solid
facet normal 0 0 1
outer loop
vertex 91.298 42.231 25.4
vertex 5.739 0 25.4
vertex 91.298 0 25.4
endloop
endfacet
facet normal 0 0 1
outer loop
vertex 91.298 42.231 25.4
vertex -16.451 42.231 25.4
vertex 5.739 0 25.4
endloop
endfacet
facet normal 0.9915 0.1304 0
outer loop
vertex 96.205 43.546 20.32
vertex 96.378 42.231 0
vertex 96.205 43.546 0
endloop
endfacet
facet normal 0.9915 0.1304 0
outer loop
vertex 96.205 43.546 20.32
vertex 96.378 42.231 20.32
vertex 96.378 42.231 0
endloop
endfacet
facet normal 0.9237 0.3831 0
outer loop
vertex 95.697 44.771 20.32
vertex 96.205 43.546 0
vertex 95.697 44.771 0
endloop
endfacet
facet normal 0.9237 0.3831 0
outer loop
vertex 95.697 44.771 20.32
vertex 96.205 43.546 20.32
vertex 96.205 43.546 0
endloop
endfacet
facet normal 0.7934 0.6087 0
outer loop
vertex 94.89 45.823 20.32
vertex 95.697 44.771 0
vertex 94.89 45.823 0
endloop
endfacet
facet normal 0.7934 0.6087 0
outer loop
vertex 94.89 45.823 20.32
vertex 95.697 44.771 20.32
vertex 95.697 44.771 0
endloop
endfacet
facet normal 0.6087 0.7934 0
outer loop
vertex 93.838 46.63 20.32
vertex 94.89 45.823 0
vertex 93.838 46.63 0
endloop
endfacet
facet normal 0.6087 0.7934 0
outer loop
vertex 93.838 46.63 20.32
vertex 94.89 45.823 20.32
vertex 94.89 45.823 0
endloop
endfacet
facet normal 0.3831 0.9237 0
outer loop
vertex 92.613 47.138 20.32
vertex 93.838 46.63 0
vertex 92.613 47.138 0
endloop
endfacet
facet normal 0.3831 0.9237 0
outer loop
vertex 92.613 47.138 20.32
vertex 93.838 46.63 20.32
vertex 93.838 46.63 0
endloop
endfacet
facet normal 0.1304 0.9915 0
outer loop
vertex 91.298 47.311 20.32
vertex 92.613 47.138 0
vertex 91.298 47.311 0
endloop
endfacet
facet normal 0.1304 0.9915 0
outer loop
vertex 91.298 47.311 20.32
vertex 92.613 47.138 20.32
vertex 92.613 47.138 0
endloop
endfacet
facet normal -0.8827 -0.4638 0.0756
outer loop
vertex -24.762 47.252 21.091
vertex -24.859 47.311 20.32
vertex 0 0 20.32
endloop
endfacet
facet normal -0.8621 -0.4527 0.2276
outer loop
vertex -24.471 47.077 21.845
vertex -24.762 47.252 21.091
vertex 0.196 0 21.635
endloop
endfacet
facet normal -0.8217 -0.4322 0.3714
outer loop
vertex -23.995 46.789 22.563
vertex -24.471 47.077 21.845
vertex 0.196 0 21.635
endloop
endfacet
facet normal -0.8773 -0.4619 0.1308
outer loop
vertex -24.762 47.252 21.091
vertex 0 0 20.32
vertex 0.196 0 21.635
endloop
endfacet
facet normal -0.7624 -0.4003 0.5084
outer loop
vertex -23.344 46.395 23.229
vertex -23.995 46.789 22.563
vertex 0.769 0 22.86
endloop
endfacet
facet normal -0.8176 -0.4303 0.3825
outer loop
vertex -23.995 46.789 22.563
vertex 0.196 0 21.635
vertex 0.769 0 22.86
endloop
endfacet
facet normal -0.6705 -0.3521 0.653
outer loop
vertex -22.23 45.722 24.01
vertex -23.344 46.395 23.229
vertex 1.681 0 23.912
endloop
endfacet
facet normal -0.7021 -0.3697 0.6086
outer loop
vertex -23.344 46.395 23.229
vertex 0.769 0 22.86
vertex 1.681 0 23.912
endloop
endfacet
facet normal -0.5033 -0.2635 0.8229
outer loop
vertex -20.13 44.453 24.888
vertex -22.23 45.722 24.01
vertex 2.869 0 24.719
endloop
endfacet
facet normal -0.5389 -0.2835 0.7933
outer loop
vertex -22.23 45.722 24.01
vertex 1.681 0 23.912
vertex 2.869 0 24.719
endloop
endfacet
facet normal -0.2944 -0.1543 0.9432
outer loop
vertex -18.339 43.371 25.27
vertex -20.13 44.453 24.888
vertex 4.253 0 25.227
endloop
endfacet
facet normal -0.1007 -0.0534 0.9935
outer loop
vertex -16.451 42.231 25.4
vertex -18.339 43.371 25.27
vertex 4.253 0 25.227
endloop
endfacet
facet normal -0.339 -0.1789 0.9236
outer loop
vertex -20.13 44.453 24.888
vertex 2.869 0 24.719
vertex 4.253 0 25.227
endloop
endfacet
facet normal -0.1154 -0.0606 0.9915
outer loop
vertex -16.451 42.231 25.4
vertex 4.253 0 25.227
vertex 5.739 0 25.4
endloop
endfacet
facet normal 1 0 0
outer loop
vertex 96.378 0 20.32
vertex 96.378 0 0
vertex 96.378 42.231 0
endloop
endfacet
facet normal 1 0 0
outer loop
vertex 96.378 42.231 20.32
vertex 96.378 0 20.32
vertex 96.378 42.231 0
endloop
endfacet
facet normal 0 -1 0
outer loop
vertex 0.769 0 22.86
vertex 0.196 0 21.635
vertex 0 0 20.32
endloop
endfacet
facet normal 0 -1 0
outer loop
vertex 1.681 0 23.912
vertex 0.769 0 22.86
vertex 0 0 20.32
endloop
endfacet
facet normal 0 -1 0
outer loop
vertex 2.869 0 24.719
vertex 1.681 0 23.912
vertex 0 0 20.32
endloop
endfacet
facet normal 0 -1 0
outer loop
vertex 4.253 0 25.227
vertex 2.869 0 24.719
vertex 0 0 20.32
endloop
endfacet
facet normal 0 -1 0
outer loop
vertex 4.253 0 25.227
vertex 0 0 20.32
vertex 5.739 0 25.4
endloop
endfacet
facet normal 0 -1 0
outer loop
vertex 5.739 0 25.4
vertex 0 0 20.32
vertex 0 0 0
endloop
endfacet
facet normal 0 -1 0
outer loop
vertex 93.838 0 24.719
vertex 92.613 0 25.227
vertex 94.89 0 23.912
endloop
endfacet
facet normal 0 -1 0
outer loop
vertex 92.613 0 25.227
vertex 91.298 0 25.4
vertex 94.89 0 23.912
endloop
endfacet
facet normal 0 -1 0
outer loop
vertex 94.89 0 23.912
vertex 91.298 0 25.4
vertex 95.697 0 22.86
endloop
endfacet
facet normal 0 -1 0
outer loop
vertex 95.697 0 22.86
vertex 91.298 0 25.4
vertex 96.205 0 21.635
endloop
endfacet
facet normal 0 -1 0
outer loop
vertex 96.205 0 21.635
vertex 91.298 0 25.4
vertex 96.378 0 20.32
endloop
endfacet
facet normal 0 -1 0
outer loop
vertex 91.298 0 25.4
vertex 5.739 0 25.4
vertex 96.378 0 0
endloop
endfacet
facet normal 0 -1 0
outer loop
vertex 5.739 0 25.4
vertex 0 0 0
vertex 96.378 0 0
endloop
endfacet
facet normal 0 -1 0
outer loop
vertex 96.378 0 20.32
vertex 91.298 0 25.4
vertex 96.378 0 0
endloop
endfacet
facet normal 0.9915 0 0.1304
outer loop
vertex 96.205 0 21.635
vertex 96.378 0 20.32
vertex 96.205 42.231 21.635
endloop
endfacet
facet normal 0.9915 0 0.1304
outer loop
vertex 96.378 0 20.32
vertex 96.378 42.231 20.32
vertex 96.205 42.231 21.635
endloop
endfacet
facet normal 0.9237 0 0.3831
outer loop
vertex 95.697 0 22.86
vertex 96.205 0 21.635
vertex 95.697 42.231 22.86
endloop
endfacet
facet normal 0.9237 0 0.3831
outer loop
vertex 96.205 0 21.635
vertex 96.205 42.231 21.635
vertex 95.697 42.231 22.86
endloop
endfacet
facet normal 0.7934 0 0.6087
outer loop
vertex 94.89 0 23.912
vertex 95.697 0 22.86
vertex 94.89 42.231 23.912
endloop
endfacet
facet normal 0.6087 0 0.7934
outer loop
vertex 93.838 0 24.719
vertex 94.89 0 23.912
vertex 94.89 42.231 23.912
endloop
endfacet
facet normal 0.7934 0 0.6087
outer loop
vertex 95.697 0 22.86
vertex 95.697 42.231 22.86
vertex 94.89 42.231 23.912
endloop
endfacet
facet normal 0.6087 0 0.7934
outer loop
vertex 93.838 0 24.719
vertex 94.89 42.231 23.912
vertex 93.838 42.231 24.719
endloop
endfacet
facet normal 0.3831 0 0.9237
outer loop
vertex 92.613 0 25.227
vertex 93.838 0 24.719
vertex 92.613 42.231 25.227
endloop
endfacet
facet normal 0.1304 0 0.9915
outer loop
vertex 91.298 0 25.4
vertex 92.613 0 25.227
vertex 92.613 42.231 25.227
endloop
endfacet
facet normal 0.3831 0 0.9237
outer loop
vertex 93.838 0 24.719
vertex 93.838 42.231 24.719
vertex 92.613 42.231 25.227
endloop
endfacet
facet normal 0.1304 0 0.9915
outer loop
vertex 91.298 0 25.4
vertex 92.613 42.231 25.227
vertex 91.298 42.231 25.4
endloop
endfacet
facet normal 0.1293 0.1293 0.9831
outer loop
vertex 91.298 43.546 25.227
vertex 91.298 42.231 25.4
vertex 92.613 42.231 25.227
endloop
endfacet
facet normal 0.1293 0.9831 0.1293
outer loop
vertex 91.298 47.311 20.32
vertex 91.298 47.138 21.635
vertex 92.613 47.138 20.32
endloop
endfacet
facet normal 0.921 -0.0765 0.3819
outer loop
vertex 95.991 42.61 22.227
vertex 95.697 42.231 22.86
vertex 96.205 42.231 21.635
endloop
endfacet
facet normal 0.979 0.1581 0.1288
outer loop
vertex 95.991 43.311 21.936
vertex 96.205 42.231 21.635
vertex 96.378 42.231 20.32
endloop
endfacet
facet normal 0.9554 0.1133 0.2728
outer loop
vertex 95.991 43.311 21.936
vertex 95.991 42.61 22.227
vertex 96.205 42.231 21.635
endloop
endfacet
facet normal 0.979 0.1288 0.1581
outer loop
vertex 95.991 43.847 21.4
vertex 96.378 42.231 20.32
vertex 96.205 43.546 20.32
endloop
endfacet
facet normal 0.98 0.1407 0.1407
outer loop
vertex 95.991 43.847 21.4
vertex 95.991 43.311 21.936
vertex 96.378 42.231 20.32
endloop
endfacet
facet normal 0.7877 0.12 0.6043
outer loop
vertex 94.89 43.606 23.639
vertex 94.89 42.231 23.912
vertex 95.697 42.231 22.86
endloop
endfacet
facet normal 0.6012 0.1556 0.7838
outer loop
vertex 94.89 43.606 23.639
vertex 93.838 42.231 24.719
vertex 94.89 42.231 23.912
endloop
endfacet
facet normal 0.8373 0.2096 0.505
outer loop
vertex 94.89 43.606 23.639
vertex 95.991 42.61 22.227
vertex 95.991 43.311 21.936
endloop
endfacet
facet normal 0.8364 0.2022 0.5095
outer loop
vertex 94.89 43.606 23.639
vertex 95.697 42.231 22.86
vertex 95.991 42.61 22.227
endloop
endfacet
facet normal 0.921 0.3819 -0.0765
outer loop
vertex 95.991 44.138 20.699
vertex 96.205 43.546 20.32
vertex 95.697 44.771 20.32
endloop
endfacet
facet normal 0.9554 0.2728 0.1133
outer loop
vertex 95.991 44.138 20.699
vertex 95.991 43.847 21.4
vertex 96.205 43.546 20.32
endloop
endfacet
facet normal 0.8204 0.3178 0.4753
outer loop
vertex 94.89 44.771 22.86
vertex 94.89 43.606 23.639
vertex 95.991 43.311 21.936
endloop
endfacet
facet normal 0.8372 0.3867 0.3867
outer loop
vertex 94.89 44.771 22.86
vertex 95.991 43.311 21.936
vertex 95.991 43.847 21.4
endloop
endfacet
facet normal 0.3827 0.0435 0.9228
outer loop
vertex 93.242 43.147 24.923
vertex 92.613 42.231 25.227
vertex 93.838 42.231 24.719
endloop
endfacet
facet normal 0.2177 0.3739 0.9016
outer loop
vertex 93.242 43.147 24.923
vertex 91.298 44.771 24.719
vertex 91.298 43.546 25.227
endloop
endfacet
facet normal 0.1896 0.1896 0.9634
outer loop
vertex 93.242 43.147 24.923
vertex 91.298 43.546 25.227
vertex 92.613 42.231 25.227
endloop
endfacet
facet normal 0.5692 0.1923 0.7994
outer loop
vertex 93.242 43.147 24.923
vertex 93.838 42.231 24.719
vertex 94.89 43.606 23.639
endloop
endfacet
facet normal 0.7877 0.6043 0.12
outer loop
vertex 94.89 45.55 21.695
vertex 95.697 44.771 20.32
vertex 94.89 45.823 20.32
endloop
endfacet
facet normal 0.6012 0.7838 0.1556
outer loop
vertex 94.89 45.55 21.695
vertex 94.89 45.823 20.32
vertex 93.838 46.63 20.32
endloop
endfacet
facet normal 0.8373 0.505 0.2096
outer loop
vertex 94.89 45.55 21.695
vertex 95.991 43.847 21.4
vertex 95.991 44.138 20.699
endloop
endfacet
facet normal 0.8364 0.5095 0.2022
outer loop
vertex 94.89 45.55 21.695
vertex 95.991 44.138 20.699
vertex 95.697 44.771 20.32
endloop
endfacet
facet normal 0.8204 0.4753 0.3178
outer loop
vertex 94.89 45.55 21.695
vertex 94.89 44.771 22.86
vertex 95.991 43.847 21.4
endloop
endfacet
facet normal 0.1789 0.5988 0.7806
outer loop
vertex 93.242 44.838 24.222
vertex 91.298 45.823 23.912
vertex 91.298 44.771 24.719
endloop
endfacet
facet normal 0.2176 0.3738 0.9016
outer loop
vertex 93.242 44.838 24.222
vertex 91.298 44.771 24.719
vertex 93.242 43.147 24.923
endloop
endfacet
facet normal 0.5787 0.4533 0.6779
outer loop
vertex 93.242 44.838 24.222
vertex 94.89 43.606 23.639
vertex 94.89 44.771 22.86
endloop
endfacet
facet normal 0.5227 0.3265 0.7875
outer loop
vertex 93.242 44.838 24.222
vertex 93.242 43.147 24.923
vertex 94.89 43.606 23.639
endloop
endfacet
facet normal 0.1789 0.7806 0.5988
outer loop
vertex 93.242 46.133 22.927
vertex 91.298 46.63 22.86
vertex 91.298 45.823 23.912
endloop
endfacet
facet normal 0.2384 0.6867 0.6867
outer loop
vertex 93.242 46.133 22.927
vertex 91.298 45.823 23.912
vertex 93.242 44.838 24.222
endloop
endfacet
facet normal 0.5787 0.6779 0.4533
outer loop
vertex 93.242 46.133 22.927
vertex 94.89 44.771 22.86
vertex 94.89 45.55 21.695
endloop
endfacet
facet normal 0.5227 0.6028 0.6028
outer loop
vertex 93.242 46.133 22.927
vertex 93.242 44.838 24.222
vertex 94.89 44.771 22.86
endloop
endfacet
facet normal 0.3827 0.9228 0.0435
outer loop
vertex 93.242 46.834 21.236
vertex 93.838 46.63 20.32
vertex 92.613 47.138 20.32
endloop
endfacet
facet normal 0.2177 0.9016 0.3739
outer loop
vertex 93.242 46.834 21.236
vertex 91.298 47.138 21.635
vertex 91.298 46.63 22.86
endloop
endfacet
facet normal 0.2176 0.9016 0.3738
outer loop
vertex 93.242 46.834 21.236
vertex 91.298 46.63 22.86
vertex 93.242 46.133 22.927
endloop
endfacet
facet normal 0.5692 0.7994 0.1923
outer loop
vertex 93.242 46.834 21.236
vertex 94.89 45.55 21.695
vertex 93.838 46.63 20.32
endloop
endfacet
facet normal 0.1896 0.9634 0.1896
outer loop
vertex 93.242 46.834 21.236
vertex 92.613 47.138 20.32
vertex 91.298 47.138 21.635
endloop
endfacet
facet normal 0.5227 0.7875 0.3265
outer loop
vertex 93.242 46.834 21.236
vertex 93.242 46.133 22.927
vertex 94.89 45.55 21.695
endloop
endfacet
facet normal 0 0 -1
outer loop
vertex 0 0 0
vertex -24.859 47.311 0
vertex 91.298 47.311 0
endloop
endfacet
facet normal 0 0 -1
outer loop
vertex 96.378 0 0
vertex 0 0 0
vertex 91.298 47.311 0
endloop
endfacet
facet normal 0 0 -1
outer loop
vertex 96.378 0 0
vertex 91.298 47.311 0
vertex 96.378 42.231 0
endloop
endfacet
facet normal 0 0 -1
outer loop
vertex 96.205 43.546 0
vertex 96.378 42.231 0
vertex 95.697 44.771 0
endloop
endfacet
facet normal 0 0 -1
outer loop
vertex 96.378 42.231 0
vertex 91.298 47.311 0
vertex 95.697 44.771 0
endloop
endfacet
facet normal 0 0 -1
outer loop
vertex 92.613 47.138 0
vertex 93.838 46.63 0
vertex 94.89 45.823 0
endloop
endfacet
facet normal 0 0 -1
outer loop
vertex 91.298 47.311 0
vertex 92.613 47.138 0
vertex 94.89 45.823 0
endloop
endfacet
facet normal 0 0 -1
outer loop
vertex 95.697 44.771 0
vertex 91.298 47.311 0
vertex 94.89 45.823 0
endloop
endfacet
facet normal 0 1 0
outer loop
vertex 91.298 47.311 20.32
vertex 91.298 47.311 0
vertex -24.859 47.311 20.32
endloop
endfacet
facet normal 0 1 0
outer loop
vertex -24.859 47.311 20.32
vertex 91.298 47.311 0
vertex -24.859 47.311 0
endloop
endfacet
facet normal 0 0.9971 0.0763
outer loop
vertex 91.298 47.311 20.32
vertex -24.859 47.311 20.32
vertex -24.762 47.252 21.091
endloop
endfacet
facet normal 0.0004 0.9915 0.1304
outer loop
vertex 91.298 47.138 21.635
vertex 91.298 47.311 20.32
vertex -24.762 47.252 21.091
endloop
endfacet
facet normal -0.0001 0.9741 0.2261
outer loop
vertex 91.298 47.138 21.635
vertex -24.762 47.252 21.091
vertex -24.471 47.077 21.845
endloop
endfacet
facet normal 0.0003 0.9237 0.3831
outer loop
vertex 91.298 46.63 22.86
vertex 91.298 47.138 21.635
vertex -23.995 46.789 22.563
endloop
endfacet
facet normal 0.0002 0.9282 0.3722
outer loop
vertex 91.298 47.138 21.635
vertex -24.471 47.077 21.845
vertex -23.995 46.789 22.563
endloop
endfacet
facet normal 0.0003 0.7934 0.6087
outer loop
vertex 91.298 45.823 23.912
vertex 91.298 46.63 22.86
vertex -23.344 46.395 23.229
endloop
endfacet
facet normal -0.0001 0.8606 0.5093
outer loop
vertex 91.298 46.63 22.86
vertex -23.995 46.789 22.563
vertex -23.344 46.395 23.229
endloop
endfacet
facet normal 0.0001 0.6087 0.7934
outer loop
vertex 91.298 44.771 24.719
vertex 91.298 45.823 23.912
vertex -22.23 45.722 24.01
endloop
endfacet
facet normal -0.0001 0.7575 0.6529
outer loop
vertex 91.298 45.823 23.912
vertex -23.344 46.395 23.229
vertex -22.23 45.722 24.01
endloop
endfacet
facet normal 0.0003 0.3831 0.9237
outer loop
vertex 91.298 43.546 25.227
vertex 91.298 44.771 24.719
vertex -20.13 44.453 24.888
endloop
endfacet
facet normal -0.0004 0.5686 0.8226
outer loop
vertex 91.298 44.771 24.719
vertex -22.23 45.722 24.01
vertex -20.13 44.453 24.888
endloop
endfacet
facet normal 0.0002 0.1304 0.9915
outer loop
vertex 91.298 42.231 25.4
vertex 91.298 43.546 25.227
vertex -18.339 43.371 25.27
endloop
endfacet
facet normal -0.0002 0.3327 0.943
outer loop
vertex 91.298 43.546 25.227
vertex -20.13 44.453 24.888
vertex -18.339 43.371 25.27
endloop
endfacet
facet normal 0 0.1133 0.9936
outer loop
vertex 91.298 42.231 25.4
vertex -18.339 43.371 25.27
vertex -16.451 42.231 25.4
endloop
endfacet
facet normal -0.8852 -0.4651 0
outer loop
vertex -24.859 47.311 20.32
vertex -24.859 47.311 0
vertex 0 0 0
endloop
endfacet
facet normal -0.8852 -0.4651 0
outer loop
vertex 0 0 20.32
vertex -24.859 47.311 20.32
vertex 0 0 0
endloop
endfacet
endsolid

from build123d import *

# Parameters (mm, degrees)
F1_DEPTH = 25.4
F2_R     = 5.08


with BuildPart() as f1:
    # F0 (on Top) → F1 (new body)
    with BuildSketch(Plane.XY):
        Polygon((-24.859279, 47.311023), (0, 0), (96.377738, 0), (96.377738, 47.311023), align=None)
    extrude(amount=F1_DEPTH)

    # F2
    f2_edges = [f1.edges().sort_by_distance(p)[0] for p in [
        (-12.42964, 23.655511, 25.4),
        (35.759229, 47.311023, 25.4),
        (96.377738, 23.655511, 25.4),
        (96.377738, 47.311023, 12.7),
    ]]
    fillet(f2_edges, radius=F2_R)


solid = f1.part
